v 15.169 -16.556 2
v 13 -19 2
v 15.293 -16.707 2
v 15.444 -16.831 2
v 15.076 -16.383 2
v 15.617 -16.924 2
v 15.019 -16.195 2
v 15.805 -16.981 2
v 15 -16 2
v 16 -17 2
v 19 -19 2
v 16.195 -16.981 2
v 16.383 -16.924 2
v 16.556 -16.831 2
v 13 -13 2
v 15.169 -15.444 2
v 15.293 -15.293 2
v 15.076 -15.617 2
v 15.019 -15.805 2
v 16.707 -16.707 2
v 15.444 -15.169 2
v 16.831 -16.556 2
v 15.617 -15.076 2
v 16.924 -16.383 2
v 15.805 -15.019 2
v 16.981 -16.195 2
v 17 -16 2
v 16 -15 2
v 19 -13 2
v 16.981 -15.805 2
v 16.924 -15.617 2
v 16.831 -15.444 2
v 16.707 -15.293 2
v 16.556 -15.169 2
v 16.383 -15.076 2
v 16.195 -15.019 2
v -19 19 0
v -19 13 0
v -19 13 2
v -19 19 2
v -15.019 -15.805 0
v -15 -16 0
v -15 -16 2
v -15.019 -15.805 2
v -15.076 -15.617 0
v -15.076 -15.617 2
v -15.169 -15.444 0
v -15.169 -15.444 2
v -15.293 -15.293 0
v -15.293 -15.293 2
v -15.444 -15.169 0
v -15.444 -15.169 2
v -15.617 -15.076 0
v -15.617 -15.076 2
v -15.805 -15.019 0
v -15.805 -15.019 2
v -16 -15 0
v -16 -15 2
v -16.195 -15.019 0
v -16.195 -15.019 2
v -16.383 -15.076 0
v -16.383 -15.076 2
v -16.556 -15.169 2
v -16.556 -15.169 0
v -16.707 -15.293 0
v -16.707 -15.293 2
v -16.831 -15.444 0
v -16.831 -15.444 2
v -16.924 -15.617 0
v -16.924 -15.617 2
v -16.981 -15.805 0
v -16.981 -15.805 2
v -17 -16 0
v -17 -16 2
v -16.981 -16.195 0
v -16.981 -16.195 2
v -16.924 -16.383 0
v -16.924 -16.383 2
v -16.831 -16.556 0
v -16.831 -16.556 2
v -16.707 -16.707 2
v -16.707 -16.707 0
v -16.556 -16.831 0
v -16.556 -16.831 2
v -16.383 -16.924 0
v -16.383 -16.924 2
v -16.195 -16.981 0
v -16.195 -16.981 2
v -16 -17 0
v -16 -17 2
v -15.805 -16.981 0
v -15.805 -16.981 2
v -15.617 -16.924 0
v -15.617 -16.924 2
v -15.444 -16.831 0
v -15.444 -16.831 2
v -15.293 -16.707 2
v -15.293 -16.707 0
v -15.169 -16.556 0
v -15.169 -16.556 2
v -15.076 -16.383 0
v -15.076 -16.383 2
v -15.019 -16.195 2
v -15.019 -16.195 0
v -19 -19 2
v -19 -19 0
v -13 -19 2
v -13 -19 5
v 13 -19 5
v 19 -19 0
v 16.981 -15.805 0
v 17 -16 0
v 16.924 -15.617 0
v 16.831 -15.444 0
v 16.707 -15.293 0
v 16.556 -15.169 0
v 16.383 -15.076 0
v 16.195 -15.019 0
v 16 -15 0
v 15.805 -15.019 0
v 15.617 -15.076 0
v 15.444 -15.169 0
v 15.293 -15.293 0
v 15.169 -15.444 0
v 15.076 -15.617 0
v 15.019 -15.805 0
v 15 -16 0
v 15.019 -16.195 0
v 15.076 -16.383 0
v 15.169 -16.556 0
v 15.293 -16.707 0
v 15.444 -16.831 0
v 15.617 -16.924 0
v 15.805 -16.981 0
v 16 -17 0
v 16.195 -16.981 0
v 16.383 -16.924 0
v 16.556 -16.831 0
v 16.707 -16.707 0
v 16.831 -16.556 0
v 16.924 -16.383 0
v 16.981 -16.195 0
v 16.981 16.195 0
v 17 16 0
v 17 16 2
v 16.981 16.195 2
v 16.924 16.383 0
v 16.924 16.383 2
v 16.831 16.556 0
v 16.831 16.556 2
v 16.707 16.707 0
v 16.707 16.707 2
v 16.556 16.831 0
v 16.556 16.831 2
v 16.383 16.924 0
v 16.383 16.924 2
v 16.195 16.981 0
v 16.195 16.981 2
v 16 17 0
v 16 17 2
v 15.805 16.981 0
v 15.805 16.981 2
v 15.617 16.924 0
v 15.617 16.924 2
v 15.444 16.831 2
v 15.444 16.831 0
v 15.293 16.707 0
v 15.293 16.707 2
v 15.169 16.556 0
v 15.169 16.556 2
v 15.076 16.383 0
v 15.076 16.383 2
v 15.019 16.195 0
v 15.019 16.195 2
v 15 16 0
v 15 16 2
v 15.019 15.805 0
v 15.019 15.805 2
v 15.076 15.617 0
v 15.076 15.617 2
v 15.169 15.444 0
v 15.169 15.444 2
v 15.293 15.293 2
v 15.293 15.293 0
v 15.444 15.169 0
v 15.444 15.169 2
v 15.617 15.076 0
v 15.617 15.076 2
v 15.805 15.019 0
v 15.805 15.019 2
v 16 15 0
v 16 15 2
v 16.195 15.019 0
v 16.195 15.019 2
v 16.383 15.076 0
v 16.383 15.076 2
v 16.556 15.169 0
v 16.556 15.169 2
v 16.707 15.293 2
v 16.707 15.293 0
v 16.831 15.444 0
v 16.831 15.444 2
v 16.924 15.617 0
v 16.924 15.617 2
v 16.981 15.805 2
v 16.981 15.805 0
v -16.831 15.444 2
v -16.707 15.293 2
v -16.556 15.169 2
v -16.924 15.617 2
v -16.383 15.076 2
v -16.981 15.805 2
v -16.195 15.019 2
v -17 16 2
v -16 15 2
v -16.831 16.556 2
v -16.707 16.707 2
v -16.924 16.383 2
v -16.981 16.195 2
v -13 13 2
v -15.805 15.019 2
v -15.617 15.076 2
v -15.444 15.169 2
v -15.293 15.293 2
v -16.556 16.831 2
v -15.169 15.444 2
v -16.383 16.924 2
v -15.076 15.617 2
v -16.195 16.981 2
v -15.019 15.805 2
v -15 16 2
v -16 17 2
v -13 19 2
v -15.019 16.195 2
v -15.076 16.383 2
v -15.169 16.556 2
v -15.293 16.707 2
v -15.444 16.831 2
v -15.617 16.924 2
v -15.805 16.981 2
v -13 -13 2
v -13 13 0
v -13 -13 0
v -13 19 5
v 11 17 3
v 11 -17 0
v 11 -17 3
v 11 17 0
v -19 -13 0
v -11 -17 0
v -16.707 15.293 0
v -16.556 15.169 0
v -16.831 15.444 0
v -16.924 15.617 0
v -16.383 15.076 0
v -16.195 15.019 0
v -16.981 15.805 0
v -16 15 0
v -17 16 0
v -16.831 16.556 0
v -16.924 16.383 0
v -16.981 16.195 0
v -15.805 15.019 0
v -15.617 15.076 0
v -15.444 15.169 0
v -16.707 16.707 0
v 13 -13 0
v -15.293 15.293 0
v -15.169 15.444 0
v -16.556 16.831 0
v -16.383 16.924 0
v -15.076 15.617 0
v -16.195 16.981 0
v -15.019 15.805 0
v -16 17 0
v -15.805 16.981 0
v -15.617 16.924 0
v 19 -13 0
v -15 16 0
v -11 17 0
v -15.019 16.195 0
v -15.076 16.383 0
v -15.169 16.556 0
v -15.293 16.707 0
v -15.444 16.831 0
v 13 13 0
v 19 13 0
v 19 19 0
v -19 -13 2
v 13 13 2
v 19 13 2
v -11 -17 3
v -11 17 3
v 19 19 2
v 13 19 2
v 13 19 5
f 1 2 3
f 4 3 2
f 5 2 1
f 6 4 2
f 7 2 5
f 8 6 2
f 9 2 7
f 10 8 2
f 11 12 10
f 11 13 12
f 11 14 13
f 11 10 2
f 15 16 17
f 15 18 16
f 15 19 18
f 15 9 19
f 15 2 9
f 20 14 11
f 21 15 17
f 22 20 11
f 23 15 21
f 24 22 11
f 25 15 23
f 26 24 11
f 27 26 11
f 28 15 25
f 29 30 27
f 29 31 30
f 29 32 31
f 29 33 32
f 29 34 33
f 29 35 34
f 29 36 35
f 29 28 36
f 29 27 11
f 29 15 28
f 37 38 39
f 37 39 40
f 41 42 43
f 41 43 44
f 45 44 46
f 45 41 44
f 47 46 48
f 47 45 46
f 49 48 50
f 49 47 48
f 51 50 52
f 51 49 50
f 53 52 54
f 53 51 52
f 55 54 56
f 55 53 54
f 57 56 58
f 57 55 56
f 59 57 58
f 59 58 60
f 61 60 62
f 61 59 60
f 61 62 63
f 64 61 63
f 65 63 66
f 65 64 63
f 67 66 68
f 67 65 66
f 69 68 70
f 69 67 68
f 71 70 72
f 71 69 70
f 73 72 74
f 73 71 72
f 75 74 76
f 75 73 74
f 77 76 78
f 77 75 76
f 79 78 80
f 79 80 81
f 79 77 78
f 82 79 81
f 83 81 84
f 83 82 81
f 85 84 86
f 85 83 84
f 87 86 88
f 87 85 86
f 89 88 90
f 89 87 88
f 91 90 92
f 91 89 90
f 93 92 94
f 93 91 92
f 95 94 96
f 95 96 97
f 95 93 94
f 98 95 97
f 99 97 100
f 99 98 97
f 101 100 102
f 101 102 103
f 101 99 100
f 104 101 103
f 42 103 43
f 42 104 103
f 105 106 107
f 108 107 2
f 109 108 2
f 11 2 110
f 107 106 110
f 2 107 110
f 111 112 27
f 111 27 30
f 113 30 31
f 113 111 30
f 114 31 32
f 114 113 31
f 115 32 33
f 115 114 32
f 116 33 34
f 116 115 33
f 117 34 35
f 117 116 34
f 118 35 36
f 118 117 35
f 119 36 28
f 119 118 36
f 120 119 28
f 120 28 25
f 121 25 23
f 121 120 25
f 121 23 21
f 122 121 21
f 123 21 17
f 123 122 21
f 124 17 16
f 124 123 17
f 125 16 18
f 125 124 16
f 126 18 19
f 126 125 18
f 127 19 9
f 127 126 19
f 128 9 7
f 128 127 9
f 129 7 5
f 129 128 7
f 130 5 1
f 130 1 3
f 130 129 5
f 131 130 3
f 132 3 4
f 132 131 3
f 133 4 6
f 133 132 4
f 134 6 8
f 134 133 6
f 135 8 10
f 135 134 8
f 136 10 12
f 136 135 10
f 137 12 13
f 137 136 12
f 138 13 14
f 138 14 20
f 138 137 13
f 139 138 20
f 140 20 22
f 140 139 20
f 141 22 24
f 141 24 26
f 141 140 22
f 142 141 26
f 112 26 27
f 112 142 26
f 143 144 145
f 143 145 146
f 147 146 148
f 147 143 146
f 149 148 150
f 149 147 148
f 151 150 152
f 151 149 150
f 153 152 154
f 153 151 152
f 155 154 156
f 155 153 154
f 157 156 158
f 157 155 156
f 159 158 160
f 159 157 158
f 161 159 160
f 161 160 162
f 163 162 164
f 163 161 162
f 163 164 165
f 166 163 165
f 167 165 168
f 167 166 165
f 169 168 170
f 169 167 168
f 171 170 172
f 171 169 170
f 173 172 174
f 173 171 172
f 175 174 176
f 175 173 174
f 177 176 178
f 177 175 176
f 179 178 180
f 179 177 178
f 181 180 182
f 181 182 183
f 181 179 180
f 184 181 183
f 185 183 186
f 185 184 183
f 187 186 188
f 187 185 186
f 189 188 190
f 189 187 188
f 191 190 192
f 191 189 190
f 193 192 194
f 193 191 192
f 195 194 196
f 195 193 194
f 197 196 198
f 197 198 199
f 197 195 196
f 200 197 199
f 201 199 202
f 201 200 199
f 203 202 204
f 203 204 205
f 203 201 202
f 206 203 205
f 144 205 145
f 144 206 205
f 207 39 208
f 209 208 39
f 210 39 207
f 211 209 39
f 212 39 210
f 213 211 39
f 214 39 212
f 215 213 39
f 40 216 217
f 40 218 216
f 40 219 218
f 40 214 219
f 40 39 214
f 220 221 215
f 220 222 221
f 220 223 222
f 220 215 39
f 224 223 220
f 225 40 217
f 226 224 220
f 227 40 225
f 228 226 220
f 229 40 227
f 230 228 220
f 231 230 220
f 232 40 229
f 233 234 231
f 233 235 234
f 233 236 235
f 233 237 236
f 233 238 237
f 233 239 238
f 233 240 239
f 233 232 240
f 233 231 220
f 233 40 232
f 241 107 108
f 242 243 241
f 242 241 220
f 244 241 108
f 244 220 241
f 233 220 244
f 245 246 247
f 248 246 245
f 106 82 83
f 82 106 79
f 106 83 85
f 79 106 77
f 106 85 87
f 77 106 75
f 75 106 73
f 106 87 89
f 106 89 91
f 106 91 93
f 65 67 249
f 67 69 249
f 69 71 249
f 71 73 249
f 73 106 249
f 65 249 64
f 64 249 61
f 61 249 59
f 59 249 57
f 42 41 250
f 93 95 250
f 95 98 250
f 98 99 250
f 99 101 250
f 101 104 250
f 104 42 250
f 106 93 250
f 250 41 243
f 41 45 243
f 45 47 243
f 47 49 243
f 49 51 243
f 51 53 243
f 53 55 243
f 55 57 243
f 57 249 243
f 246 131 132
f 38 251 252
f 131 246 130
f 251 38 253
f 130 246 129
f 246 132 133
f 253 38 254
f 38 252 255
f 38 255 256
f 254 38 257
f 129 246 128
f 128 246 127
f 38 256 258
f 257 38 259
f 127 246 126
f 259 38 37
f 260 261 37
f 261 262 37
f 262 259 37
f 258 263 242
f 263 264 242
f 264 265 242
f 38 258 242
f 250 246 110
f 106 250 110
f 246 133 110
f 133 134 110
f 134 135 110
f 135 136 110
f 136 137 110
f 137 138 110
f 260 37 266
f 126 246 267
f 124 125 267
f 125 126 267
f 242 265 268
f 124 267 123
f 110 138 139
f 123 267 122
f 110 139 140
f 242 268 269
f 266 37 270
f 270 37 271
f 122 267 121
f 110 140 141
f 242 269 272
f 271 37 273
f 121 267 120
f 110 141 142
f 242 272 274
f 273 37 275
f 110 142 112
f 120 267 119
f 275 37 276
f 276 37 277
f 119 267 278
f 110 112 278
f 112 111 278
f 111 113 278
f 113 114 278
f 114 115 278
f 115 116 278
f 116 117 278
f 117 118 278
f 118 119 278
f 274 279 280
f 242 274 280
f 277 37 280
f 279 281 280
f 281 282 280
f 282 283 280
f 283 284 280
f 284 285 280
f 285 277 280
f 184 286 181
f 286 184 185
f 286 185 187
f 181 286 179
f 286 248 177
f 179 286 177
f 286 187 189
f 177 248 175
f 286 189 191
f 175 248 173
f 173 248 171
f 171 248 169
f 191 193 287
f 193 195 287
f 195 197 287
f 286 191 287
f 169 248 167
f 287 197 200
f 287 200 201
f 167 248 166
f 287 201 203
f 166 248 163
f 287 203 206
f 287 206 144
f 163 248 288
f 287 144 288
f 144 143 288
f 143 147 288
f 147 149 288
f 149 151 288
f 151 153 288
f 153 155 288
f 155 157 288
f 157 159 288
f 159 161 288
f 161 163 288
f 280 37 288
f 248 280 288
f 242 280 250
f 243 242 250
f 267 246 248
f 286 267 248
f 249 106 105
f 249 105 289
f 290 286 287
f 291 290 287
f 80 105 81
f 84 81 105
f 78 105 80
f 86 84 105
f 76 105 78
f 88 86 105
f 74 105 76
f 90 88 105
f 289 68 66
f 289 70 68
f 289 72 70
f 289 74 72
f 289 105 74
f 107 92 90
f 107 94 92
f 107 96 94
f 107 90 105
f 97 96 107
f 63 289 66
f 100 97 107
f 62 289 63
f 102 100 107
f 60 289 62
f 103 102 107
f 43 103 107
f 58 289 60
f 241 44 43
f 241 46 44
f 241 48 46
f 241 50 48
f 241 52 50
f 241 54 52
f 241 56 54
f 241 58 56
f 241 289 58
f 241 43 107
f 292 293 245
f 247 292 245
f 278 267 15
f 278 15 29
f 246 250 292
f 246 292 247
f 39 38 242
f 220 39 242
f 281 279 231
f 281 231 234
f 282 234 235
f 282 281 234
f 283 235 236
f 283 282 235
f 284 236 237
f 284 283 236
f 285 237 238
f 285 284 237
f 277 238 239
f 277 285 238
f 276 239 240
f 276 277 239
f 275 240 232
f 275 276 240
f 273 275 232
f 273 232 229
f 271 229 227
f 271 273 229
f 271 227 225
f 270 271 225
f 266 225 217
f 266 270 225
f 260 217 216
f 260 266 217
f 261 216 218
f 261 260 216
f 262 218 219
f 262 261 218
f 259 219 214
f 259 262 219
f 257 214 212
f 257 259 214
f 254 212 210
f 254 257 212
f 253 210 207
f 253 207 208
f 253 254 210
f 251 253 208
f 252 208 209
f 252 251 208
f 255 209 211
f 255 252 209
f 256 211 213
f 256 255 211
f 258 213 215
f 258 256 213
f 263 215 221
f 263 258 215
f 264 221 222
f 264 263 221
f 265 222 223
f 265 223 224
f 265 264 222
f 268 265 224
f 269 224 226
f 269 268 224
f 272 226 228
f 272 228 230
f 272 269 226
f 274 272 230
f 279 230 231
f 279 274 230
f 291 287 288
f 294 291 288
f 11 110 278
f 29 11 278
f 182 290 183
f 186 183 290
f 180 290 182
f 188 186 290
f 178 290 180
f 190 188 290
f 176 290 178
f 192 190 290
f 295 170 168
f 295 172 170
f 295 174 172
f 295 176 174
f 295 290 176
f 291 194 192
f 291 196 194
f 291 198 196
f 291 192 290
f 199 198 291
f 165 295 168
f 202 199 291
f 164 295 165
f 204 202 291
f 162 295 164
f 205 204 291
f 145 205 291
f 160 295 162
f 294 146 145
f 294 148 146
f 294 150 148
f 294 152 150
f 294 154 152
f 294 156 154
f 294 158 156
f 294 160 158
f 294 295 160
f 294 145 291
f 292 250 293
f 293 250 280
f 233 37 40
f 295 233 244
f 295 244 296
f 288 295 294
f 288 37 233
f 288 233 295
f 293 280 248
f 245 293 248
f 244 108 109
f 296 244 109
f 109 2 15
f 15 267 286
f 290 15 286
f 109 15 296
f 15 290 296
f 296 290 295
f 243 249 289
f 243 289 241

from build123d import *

# Parameters (mm, degrees)
SKETCH_1_W          = 26
SKETCH_1_H          = 38
EXTRUDE_1_DEPTH     = 5
SKETCH_2_W          = 22
SKETCH_2_H          = 34
CUT_EXTRUDE_1_DEPTH = 3
SKETCH_4_W          = 6
SKETCH_4_H          = 6
EXTRUDE_2_DEPTH     = 2
SKETCH_5_R          = 1
CUT_EXTRUDE_4_DEPTH = 2


with BuildPart() as part:
    # ｽｹｯﾁ1 → ﾎﾞｽ - 押し出し1 (new body)
    with BuildSketch(Plane.XY):
        Rectangle(SKETCH_1_W, SKETCH_1_H)
    extrude(amount=EXTRUDE_1_DEPTH)

    # ｽｹｯﾁ2 → ｶｯﾄ - 押し出し1 (cut)
    with BuildSketch(Plane.XY):
        Rectangle(SKETCH_2_W, SKETCH_2_H)
    extrude(amount=CUT_EXTRUDE_1_DEPTH, mode=Mode.SUBTRACT)

    # ｽｹｯﾁ4 → ﾎﾞｽ - 押し出し2 (add)
    with BuildSketch(Plane.XY):
        with Locations((16, 16)):
            Rectangle(SKETCH_4_W, SKETCH_4_H)
        with Locations((16, -16)):
            Rectangle(SKETCH_4_W, SKETCH_4_H)
        with Locations((-16, -16)):
            Rectangle(SKETCH_4_W, SKETCH_4_H)
        with Locations((-16, 16)):
            Rectangle(SKETCH_4_W, SKETCH_4_H)
    extrude(amount=EXTRUDE_2_DEPTH)

    # ｽｹｯﾁ5 → ｶｯﾄ - 押し出し4 (cut)
    with BuildSketch(Plane.XY):
        with Locations((-16, 16)):
            Circle(SKETCH_5_R)
        with Locations((-16, -16)):
            Circle(SKETCH_5_R)
        with Locations((16, -16)):
            Circle(SKETCH_5_R)
        with Locations((16, 16)):
            Circle(SKETCH_5_R)
    extrude(amount=CUT_EXTRUDE_4_DEPTH, mode=Mode.SUBTRACT)


solid = part.part
